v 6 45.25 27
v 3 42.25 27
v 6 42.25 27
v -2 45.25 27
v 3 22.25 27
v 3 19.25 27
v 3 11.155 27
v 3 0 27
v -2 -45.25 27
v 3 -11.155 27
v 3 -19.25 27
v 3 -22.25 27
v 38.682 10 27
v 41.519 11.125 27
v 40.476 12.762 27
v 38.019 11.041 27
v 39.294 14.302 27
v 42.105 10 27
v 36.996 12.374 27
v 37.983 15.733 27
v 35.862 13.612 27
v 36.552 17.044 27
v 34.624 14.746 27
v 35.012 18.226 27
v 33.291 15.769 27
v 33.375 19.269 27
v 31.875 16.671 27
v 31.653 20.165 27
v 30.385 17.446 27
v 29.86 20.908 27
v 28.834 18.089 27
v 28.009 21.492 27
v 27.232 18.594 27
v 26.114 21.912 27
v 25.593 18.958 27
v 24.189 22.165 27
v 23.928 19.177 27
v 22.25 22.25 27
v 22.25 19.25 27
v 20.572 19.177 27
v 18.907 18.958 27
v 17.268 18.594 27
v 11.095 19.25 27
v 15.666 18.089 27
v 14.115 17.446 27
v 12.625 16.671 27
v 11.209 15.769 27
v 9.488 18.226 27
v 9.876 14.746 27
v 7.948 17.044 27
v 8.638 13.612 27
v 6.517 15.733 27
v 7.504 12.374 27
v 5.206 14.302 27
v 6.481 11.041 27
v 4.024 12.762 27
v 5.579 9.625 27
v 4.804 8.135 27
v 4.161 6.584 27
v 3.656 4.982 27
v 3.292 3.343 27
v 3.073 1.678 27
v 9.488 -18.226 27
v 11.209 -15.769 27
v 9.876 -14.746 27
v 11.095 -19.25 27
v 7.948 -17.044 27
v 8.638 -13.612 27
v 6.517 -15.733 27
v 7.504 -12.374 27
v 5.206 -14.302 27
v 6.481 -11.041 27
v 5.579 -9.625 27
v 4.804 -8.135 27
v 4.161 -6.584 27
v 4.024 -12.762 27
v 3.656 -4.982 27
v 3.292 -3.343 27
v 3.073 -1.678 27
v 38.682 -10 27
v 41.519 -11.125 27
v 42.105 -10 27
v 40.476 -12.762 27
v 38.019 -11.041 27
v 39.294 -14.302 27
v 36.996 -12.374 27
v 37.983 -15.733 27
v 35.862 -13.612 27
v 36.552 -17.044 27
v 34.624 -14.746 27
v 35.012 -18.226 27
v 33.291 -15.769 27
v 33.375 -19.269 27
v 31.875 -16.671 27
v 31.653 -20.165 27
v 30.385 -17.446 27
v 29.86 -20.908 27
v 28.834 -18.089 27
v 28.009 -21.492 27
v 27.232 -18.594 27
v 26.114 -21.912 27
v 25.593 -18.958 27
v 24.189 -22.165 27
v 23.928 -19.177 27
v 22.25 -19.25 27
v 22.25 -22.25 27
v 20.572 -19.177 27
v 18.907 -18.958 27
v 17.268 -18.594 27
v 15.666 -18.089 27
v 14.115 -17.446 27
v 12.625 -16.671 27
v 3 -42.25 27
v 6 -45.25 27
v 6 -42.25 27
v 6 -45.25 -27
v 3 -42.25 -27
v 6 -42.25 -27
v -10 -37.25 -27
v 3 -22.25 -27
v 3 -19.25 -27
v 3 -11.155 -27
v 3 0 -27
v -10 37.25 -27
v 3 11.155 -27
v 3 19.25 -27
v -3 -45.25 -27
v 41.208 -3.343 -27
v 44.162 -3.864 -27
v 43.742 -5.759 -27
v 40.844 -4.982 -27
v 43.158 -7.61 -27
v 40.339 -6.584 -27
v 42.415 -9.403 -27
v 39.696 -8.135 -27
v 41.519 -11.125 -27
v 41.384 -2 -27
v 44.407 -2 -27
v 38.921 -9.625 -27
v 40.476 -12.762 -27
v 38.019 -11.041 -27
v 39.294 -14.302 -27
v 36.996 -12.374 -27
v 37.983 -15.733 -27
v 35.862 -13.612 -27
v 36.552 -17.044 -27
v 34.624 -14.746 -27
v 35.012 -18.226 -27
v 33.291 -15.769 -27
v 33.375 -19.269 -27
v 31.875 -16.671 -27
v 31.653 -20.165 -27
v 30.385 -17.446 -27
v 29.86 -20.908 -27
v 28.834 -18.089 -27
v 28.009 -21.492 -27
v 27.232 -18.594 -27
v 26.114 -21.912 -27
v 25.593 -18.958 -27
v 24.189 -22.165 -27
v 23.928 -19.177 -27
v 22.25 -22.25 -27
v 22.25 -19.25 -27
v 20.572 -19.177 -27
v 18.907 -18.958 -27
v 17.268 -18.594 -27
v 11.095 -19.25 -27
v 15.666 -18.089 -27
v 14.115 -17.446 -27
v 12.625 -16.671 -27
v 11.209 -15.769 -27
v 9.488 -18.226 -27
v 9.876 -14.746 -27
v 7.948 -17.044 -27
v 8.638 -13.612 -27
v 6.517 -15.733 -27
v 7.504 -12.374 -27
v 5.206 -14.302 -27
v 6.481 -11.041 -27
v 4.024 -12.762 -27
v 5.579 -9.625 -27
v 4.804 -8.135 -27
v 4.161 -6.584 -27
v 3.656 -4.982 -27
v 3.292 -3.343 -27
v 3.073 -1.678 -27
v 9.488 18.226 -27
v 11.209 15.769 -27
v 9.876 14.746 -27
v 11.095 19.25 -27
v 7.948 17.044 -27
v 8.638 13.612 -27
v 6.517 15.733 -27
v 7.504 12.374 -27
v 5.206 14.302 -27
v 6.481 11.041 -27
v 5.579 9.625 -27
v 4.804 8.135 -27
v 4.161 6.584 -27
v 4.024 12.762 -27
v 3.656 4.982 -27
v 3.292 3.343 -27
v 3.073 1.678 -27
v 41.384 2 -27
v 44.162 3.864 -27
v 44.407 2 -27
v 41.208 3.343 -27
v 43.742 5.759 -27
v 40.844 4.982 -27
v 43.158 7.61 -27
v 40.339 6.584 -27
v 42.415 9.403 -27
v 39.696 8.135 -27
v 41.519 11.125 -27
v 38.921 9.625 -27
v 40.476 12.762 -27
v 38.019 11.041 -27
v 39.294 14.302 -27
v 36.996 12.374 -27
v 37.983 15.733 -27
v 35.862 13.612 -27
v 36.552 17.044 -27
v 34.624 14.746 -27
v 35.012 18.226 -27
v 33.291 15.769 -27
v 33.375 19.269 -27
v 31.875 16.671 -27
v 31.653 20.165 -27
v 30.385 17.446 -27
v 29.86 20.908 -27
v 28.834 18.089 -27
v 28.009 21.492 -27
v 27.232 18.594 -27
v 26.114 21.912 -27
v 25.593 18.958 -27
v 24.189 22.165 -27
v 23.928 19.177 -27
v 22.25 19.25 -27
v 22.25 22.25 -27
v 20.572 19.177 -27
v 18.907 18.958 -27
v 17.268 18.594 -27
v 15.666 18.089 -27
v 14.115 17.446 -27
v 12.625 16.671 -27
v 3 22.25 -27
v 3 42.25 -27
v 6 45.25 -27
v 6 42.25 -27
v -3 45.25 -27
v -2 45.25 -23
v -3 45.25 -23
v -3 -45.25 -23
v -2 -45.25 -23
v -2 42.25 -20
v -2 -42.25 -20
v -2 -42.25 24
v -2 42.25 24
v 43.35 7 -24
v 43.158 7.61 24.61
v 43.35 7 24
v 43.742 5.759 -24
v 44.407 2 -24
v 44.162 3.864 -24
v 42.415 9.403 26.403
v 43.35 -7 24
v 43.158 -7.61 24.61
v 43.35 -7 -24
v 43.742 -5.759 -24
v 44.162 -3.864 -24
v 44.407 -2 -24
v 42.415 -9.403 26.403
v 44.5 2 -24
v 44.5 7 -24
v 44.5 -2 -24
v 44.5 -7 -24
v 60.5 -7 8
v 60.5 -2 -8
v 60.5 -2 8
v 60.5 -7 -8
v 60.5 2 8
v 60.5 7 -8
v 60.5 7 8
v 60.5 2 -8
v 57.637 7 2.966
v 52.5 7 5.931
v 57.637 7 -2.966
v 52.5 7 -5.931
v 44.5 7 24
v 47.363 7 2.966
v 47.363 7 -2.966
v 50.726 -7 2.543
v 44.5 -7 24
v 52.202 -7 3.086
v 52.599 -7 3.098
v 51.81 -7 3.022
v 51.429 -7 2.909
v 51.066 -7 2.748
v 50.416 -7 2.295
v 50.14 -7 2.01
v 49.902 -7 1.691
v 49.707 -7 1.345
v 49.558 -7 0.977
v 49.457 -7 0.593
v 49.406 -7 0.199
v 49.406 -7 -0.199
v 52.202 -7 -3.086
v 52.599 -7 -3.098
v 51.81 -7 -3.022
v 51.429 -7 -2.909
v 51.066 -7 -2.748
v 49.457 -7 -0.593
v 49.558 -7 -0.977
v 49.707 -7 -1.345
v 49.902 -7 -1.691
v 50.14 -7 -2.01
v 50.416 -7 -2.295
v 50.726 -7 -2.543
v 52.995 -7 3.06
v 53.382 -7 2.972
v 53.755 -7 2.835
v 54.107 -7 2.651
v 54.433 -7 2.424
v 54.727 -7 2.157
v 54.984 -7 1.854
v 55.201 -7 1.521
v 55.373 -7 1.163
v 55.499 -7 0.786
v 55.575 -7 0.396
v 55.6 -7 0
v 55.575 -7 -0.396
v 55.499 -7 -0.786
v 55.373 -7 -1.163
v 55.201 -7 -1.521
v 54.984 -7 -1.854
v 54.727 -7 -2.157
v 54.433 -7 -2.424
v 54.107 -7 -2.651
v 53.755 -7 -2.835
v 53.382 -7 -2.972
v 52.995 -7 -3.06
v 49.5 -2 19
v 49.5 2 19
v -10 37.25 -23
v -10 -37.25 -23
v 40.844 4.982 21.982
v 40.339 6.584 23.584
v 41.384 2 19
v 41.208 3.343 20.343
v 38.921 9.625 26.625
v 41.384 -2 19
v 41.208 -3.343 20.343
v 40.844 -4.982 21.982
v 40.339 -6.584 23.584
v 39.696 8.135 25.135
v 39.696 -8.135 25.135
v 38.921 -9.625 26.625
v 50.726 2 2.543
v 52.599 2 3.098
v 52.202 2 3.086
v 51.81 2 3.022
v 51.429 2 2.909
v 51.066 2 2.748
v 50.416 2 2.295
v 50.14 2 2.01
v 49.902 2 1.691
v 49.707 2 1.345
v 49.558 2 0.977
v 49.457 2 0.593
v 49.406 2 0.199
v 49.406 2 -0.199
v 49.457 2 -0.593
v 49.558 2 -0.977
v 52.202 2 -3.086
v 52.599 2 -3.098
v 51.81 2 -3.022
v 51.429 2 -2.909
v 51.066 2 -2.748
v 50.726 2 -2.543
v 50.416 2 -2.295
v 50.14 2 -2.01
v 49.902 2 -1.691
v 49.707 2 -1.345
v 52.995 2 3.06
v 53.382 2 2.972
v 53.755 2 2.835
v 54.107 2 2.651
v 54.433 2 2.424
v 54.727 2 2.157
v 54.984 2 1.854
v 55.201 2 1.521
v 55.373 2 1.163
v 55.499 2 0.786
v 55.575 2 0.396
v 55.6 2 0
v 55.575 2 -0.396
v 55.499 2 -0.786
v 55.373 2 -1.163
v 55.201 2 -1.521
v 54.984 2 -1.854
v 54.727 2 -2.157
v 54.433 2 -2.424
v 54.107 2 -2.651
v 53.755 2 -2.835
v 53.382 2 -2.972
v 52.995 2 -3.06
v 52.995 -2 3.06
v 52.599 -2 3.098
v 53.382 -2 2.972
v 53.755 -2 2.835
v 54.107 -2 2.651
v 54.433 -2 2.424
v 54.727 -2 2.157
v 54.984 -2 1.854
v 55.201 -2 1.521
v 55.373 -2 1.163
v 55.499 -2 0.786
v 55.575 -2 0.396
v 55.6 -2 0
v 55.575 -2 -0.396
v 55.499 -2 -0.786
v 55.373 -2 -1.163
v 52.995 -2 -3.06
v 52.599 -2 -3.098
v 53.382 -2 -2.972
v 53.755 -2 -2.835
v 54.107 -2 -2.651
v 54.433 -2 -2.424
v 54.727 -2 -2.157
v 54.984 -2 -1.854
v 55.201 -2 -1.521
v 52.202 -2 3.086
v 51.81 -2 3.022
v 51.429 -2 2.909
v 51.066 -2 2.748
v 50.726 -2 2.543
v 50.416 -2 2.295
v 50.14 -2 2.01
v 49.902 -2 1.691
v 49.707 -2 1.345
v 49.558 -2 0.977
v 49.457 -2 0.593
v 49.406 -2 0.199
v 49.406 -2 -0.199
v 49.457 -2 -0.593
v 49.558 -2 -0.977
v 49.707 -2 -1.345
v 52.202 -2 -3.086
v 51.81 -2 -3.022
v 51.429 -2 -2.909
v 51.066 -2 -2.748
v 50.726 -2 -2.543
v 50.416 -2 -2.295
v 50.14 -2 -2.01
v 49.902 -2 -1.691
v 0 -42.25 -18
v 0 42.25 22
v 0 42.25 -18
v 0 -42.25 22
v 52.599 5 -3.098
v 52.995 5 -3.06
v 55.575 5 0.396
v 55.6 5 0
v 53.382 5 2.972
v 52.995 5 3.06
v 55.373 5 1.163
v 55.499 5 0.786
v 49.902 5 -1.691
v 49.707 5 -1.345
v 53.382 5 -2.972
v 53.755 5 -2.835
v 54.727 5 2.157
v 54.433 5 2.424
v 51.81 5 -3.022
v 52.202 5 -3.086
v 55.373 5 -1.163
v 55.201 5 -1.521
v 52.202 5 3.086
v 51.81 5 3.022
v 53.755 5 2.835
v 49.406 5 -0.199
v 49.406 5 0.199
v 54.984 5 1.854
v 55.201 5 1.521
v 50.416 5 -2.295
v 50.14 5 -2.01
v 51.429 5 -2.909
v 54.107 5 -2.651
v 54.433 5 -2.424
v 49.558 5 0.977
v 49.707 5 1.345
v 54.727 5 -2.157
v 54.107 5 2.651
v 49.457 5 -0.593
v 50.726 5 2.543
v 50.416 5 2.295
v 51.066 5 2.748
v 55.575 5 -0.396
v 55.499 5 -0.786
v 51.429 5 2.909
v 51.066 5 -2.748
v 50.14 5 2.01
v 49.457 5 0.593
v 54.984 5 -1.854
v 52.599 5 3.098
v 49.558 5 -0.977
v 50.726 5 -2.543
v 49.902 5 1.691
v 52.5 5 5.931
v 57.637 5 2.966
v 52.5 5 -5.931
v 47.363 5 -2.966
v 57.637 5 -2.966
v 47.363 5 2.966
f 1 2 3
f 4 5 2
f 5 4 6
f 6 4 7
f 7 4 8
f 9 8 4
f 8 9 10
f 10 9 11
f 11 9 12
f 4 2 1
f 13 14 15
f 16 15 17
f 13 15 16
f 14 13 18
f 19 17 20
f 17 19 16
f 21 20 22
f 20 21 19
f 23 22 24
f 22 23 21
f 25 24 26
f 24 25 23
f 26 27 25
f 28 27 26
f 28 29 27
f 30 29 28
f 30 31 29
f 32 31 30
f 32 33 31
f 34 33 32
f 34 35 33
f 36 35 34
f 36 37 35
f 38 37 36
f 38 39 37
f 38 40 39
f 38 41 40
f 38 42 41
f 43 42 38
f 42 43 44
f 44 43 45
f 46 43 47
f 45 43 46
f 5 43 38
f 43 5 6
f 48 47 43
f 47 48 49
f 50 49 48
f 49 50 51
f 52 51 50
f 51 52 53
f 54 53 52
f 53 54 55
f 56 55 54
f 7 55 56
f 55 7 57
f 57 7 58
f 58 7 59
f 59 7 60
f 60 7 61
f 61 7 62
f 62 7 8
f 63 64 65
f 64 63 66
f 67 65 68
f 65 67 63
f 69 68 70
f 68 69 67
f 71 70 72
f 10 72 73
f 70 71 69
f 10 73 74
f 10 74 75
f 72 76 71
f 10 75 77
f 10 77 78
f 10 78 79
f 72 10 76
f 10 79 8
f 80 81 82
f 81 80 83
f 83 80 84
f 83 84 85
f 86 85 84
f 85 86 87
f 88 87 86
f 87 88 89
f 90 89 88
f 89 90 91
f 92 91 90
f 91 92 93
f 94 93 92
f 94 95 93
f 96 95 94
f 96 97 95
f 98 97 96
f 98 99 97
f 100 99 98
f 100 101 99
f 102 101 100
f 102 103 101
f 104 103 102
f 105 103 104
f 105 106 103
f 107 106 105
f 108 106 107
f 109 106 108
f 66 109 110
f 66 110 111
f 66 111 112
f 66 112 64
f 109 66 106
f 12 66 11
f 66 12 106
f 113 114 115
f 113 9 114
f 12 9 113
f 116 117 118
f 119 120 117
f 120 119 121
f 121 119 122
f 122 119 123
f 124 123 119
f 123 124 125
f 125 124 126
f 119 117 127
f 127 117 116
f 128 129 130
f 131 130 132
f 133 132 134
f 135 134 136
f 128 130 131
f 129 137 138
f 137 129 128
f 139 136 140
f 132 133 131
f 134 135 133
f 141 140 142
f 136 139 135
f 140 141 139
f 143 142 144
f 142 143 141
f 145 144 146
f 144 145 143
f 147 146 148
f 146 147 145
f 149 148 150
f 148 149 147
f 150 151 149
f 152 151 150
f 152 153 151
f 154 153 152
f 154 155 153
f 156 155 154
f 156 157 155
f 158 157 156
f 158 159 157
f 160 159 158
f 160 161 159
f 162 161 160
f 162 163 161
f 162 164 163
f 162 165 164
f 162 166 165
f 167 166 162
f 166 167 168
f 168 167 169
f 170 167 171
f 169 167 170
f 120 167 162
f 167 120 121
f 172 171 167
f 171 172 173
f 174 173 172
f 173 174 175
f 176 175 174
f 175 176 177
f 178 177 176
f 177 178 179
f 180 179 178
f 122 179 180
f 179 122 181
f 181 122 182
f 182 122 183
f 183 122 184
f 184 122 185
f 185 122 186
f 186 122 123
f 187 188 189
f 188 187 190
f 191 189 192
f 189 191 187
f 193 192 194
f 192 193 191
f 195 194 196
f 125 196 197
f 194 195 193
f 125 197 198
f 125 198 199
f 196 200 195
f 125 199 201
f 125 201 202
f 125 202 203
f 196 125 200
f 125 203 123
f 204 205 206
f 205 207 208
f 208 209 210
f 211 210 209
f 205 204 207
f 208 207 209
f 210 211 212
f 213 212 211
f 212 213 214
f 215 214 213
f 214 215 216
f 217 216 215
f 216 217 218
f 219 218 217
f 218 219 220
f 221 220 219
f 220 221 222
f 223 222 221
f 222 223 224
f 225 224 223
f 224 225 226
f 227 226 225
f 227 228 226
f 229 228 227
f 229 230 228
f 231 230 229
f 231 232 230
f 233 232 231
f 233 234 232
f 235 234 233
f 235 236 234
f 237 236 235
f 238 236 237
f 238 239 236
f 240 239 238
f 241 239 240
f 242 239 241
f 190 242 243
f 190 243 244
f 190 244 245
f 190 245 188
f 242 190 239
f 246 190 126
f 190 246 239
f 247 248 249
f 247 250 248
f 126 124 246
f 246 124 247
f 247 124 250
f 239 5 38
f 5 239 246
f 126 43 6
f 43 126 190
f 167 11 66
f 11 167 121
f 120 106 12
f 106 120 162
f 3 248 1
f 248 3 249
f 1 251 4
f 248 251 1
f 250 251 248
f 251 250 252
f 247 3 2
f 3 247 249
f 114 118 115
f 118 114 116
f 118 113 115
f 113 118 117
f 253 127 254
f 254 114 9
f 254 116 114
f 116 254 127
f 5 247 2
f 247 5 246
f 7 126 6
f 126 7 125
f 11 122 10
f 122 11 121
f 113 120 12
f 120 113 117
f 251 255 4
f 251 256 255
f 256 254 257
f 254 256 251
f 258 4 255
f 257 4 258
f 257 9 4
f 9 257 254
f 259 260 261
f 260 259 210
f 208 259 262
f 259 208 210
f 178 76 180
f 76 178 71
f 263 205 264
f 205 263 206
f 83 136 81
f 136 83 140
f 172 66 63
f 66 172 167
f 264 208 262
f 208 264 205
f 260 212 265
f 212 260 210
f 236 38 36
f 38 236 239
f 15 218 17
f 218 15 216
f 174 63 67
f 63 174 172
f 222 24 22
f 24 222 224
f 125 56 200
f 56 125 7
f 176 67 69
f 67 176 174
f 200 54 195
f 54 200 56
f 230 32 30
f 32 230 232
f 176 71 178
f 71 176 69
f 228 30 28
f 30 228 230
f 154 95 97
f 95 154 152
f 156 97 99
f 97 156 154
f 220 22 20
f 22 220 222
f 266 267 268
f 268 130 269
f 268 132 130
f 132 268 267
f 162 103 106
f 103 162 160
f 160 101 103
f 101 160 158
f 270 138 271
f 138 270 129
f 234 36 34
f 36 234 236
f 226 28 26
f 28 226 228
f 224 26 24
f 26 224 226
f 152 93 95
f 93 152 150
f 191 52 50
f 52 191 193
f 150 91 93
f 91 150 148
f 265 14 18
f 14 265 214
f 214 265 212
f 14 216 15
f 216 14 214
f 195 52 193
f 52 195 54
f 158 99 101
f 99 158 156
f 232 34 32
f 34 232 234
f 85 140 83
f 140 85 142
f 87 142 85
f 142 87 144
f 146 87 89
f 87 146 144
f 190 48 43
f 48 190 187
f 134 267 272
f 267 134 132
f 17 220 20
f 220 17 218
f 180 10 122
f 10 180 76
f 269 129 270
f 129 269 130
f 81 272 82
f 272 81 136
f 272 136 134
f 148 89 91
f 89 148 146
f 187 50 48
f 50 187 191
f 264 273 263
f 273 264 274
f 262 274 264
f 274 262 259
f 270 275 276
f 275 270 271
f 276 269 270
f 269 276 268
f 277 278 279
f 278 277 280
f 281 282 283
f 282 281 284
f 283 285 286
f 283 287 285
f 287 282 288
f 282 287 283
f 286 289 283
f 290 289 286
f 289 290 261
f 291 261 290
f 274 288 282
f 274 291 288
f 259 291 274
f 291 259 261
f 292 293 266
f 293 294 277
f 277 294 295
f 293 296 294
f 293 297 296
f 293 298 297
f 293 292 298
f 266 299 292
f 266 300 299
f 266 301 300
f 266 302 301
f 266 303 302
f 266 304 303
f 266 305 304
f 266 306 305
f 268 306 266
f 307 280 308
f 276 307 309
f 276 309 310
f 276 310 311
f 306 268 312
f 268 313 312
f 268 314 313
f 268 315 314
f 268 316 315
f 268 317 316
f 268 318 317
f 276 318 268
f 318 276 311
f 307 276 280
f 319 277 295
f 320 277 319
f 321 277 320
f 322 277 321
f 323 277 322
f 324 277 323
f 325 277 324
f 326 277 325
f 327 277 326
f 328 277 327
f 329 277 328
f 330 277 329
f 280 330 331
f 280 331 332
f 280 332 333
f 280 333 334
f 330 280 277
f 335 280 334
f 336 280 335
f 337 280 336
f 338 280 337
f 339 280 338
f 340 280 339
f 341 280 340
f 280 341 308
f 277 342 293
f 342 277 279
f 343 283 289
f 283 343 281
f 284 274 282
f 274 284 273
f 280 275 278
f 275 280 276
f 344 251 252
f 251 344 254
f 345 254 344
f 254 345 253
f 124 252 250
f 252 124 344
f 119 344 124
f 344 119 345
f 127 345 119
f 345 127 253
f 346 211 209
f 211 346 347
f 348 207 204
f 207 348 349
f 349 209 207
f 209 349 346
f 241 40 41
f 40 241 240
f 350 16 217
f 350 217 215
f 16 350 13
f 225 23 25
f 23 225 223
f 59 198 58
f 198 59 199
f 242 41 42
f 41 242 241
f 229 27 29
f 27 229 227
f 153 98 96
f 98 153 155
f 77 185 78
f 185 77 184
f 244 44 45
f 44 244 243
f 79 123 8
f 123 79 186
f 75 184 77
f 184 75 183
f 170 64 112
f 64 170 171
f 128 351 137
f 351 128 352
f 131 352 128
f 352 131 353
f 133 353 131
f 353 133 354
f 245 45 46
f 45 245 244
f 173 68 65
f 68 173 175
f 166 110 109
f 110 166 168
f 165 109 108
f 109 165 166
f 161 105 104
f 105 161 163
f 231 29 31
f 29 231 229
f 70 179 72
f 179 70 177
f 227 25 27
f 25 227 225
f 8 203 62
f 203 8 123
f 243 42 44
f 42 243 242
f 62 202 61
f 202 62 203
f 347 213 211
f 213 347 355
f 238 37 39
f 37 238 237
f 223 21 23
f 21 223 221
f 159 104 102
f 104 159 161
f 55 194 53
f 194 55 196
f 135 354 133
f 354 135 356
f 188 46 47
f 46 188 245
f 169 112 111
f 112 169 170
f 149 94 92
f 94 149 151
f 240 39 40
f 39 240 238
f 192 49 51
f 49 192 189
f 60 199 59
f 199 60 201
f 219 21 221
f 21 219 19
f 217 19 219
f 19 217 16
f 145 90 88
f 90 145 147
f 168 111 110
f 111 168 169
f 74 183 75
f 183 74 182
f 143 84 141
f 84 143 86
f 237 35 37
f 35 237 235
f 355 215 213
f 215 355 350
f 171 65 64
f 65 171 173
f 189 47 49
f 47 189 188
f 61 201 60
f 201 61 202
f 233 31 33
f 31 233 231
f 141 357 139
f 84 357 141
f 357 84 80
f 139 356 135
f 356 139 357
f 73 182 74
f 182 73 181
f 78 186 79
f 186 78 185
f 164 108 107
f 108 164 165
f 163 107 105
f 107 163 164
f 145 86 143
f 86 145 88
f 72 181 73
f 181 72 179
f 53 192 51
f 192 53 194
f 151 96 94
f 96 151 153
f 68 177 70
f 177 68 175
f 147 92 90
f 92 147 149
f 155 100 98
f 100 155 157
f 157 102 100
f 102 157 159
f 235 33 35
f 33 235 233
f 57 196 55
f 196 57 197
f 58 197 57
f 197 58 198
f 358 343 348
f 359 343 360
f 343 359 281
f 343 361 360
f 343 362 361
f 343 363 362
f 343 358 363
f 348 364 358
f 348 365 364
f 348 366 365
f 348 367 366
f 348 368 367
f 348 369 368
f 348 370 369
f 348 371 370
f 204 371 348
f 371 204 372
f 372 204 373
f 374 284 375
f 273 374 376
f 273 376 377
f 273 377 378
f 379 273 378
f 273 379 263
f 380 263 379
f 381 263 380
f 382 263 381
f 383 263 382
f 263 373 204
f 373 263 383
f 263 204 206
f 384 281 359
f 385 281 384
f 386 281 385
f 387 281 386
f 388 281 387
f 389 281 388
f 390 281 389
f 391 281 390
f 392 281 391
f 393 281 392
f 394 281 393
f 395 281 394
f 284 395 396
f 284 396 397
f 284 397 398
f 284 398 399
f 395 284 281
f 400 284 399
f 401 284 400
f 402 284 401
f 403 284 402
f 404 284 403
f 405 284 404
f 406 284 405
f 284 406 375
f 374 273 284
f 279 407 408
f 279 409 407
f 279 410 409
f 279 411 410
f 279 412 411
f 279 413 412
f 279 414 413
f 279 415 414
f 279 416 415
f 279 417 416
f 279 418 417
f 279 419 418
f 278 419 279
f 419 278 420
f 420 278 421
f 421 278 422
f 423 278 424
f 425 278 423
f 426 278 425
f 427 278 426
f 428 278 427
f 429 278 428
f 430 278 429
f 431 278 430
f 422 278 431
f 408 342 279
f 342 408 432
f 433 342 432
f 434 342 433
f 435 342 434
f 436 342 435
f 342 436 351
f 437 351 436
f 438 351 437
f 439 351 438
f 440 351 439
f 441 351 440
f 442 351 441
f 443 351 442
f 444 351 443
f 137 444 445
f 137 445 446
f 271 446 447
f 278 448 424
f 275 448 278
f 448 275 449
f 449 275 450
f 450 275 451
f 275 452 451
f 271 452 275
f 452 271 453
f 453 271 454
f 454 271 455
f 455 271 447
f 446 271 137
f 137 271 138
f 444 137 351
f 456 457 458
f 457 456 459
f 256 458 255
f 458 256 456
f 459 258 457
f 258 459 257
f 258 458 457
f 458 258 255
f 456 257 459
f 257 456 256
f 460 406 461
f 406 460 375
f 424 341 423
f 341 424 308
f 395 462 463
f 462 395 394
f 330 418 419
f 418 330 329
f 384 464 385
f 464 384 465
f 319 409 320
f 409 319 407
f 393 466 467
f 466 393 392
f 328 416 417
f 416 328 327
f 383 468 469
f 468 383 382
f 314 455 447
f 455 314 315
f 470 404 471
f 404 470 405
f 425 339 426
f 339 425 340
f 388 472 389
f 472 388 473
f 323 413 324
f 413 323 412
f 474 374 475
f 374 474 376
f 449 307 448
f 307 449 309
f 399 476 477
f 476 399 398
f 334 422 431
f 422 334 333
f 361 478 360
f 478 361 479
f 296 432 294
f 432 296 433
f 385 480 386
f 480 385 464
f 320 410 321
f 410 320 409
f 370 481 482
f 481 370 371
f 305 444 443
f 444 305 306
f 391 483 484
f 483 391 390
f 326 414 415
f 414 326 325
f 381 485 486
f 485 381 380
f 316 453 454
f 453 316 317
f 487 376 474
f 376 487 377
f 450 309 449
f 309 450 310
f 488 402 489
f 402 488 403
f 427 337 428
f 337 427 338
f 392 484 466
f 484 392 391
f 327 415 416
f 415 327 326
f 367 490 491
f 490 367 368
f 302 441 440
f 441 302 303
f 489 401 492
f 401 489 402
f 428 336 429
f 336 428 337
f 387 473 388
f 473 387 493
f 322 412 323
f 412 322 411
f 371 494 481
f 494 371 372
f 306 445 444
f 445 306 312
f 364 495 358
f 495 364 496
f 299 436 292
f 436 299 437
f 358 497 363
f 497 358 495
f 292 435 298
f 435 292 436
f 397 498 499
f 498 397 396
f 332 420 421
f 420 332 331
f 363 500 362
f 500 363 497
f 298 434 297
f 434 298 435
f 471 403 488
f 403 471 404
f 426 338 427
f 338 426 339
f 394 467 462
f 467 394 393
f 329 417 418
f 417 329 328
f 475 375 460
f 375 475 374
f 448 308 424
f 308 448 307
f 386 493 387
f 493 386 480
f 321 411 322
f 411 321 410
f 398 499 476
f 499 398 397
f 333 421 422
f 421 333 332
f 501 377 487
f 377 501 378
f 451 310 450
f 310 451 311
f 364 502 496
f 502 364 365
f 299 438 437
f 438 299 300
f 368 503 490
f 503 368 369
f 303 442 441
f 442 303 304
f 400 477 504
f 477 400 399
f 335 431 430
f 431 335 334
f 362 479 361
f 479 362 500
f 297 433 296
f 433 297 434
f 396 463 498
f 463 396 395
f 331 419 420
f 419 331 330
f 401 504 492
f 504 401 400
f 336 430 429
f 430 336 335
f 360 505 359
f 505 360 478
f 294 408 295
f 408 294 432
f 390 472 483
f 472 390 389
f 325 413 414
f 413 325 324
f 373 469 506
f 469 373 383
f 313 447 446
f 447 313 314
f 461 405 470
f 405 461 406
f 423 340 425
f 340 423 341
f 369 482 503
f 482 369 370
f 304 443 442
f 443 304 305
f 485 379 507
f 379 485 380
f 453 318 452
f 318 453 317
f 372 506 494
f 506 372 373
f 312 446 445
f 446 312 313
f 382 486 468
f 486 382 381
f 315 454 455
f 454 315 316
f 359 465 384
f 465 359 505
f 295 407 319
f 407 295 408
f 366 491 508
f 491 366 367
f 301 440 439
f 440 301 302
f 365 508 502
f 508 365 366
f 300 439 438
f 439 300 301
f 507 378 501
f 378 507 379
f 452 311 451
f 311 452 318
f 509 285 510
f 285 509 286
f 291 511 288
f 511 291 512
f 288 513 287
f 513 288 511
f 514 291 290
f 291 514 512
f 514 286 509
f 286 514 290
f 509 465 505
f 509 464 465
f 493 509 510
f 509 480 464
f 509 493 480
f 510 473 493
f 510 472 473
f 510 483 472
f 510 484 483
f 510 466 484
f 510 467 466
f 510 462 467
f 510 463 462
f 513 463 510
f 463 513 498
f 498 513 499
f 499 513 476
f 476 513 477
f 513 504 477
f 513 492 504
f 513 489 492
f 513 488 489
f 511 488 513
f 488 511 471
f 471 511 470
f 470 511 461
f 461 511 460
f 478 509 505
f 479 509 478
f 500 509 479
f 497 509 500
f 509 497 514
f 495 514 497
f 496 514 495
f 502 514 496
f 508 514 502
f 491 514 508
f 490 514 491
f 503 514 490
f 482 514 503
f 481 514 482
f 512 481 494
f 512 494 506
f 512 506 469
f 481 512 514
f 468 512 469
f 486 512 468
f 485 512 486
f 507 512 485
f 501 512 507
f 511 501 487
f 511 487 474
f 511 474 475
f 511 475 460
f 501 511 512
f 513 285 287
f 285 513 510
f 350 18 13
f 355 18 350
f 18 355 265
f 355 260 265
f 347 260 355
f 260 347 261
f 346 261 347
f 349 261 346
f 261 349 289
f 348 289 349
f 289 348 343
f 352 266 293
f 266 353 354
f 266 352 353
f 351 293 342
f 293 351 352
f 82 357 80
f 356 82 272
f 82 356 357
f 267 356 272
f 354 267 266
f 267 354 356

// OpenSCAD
// 2013 Lukas Süss aka mechadense
// License CC-BY-NC
// Umbrella holder





// Diameter of the umbrellas tube (+0.5mm)
dtube = 38.5;
//38;
rtube = dtube/2;

// Width of the bands used to fixate the holder onto one of the rectangular bars
wband = 20;

// hight of the rectangulat bar on which to mount the holder
sbar0 = 50;

// thickness of hook
shook = 4;

// depth of hook
dhook = 8;

sbar = sbar0+shook;
//50.5

//----

// baseplate thickness
tplate = 3.0;

// tubeholder thickness 
ttubewall = 3.0; // wall thickness of the pipe segment


// width of gap to adjust for tube diameter variations
adjustgap = 4;

// thickness of adjustment brackets
tadjust = 5;
// size of brackets
sadjust = 16;

// width of outer band guides
wrim = 3;

// hight of outer band guides
hrim = 3;


// resolution: minimum facet length
$fs=0.4;
// resolution: maximal facet angle
$fa=5;

// baseplate groovedepth for soft material
tinset = 2;

// total length of part
lges = dtube+2*ttubewall+2*wband+2*wrim;

// screw diameter
dscrew = 6;

// screw clearance
scrclr = 0.2;

// nut or screwhead wrench size
s = 10.1;



difference()
{
  union()
  {
    //Baseplate
    translate([tplate/2-tinset/2,0,0*sbar/2])
    cube([tplate+tinset,lges,sbar],center=true);
 
    //Tubeholder Basebody
    translate([(rtube+ttubewall),0,0])
      cylinder(r1=rtube+ttubewall,r2=rtube+ttubewall-0,h=sbar,center=true);

    // inner band guides and structural integrity
    translate([(rtube+ttubewall)/2,0,0])
    {
      translate([0,-tplate/2+(rtube+ttubewall),0])
        cube([(rtube+ttubewall),tplate,sbar],center=true);
      translate([0,-(-tplate/2+(rtube+ttubewall)),0])
        cube([(rtube+ttubewall),tplate,sbar],center=true);
    }
    // outer band guides
    translate([(tplate+hrim)/2,0,0])
    {
      translate([0,+(lges/2-wrim/2),0])
        cube([tplate+hrim,wrim,sbar],center=true);
      translate([0,-(lges/2-wrim/2),0])
        cube([tplate+hrim,wrim,sbar],center=true);
    }

    // base body for clamping bracket
    hull()
    {
      translate([(dtube+2*ttubewall)/2,0,0])
        cube([dtube+2*ttubewall,tadjust*2+adjustgap,3*sadjust],center=true);
      translate([(dtube+2*ttubewall+sadjust)/2,0,0])
        cube([dtube+2*ttubewall+sadjust,tadjust*2+adjustgap,sadjust],center=true);
    }
    hull()
    {
      translate([-dhook/2-tinset,0,-sbar/2+shook/2])
      cube([dhook,lges-2*dhook,shook],center=true);

      translate([-1/2-tinset,0,-sbar/2+shook/2])
      cube([1,lges,shook],center=true);
    }
  }

  //Tube holder cut
  translate([(rtube+ttubewall),0,0])
    cylinder(r=rtube,h=sbar*1.2,center=true);

  // adjustment gap cutter
  translate([dtube*1.5,0,0])
    cube([dtube,adjustgap,sbar*1.2],center=true);

  // inset cutter
  translate([0,0,shook/2])
  hull()
  {
    translate([-(tinset+1)/2,0,0])
    cube([tinset+1,lges-2*wrim,sbar0-2*wrim-2*tinset],center=true);

    translate([-1/2-tinset,0,0])
    cube([1,lges-2*wrim,sbar0-2*wrim],center=true);
  }

  // clamp screwhole
  // asserted: clampthickness < smaller tubeholder
  translate([dtube+2*ttubewall+sadjust/2,0,0]) rotate(90,[1,0,0])
    cylinder(r=dscrew/2+scrclr/2,h=dtube,center=true);
  // add hex inset for nut!
  translate([dtube+2*ttubewall+sadjust/2,adjustgap/2+tadjust-2,0]) // <<<<< 
    rotate(30,[0,1,0]) rotate(-90,[1,0,0])
    cylinder(r=s/2/cos(30)+scrclr/2,h=dtube,$fn=6,center=false);

 
  //several material saving cuts
  /*
  translate([0,+rtube*0.61803,0]) cuts1();
  translate([0,-rtube*0.61803,0]) cuts1();
  */
  translate([+rtube,0,+sbar/2]) rotate(90,[0,1,0])
    cylinder(r=10,h=dtube*1.5,$fn=4);
  //translate([+rtube,0,-sbar/2]) rotate(90,[0,1,0])
  //  cylinder(r=10,h=dtube*1.5,$fn=4);

  //translate([0,lges/2+1,0]) cuts2(20);
  //translate([0,-(lges/2+1),0]) cuts2(20);
}

module cuts1()
{
  translate([0,0,-0.05])
    cylinder(r1=sbar/8*1.6,r2=0,h=sbar/4*1.4,$fn=4);
    translate([0,0,+0.05]) scale([1,1,-1])
    cylinder(r1=sbar/8*1.6,r2=0,h=sbar/4*1.4,$fn=4);

}

module cuts2(s)
{
  hull()
  {
    cube([20,2,sbar*0.75],center=true);
    cube([20,2+s,sbar*0.75-1.5*s],center=true);
  }
}
